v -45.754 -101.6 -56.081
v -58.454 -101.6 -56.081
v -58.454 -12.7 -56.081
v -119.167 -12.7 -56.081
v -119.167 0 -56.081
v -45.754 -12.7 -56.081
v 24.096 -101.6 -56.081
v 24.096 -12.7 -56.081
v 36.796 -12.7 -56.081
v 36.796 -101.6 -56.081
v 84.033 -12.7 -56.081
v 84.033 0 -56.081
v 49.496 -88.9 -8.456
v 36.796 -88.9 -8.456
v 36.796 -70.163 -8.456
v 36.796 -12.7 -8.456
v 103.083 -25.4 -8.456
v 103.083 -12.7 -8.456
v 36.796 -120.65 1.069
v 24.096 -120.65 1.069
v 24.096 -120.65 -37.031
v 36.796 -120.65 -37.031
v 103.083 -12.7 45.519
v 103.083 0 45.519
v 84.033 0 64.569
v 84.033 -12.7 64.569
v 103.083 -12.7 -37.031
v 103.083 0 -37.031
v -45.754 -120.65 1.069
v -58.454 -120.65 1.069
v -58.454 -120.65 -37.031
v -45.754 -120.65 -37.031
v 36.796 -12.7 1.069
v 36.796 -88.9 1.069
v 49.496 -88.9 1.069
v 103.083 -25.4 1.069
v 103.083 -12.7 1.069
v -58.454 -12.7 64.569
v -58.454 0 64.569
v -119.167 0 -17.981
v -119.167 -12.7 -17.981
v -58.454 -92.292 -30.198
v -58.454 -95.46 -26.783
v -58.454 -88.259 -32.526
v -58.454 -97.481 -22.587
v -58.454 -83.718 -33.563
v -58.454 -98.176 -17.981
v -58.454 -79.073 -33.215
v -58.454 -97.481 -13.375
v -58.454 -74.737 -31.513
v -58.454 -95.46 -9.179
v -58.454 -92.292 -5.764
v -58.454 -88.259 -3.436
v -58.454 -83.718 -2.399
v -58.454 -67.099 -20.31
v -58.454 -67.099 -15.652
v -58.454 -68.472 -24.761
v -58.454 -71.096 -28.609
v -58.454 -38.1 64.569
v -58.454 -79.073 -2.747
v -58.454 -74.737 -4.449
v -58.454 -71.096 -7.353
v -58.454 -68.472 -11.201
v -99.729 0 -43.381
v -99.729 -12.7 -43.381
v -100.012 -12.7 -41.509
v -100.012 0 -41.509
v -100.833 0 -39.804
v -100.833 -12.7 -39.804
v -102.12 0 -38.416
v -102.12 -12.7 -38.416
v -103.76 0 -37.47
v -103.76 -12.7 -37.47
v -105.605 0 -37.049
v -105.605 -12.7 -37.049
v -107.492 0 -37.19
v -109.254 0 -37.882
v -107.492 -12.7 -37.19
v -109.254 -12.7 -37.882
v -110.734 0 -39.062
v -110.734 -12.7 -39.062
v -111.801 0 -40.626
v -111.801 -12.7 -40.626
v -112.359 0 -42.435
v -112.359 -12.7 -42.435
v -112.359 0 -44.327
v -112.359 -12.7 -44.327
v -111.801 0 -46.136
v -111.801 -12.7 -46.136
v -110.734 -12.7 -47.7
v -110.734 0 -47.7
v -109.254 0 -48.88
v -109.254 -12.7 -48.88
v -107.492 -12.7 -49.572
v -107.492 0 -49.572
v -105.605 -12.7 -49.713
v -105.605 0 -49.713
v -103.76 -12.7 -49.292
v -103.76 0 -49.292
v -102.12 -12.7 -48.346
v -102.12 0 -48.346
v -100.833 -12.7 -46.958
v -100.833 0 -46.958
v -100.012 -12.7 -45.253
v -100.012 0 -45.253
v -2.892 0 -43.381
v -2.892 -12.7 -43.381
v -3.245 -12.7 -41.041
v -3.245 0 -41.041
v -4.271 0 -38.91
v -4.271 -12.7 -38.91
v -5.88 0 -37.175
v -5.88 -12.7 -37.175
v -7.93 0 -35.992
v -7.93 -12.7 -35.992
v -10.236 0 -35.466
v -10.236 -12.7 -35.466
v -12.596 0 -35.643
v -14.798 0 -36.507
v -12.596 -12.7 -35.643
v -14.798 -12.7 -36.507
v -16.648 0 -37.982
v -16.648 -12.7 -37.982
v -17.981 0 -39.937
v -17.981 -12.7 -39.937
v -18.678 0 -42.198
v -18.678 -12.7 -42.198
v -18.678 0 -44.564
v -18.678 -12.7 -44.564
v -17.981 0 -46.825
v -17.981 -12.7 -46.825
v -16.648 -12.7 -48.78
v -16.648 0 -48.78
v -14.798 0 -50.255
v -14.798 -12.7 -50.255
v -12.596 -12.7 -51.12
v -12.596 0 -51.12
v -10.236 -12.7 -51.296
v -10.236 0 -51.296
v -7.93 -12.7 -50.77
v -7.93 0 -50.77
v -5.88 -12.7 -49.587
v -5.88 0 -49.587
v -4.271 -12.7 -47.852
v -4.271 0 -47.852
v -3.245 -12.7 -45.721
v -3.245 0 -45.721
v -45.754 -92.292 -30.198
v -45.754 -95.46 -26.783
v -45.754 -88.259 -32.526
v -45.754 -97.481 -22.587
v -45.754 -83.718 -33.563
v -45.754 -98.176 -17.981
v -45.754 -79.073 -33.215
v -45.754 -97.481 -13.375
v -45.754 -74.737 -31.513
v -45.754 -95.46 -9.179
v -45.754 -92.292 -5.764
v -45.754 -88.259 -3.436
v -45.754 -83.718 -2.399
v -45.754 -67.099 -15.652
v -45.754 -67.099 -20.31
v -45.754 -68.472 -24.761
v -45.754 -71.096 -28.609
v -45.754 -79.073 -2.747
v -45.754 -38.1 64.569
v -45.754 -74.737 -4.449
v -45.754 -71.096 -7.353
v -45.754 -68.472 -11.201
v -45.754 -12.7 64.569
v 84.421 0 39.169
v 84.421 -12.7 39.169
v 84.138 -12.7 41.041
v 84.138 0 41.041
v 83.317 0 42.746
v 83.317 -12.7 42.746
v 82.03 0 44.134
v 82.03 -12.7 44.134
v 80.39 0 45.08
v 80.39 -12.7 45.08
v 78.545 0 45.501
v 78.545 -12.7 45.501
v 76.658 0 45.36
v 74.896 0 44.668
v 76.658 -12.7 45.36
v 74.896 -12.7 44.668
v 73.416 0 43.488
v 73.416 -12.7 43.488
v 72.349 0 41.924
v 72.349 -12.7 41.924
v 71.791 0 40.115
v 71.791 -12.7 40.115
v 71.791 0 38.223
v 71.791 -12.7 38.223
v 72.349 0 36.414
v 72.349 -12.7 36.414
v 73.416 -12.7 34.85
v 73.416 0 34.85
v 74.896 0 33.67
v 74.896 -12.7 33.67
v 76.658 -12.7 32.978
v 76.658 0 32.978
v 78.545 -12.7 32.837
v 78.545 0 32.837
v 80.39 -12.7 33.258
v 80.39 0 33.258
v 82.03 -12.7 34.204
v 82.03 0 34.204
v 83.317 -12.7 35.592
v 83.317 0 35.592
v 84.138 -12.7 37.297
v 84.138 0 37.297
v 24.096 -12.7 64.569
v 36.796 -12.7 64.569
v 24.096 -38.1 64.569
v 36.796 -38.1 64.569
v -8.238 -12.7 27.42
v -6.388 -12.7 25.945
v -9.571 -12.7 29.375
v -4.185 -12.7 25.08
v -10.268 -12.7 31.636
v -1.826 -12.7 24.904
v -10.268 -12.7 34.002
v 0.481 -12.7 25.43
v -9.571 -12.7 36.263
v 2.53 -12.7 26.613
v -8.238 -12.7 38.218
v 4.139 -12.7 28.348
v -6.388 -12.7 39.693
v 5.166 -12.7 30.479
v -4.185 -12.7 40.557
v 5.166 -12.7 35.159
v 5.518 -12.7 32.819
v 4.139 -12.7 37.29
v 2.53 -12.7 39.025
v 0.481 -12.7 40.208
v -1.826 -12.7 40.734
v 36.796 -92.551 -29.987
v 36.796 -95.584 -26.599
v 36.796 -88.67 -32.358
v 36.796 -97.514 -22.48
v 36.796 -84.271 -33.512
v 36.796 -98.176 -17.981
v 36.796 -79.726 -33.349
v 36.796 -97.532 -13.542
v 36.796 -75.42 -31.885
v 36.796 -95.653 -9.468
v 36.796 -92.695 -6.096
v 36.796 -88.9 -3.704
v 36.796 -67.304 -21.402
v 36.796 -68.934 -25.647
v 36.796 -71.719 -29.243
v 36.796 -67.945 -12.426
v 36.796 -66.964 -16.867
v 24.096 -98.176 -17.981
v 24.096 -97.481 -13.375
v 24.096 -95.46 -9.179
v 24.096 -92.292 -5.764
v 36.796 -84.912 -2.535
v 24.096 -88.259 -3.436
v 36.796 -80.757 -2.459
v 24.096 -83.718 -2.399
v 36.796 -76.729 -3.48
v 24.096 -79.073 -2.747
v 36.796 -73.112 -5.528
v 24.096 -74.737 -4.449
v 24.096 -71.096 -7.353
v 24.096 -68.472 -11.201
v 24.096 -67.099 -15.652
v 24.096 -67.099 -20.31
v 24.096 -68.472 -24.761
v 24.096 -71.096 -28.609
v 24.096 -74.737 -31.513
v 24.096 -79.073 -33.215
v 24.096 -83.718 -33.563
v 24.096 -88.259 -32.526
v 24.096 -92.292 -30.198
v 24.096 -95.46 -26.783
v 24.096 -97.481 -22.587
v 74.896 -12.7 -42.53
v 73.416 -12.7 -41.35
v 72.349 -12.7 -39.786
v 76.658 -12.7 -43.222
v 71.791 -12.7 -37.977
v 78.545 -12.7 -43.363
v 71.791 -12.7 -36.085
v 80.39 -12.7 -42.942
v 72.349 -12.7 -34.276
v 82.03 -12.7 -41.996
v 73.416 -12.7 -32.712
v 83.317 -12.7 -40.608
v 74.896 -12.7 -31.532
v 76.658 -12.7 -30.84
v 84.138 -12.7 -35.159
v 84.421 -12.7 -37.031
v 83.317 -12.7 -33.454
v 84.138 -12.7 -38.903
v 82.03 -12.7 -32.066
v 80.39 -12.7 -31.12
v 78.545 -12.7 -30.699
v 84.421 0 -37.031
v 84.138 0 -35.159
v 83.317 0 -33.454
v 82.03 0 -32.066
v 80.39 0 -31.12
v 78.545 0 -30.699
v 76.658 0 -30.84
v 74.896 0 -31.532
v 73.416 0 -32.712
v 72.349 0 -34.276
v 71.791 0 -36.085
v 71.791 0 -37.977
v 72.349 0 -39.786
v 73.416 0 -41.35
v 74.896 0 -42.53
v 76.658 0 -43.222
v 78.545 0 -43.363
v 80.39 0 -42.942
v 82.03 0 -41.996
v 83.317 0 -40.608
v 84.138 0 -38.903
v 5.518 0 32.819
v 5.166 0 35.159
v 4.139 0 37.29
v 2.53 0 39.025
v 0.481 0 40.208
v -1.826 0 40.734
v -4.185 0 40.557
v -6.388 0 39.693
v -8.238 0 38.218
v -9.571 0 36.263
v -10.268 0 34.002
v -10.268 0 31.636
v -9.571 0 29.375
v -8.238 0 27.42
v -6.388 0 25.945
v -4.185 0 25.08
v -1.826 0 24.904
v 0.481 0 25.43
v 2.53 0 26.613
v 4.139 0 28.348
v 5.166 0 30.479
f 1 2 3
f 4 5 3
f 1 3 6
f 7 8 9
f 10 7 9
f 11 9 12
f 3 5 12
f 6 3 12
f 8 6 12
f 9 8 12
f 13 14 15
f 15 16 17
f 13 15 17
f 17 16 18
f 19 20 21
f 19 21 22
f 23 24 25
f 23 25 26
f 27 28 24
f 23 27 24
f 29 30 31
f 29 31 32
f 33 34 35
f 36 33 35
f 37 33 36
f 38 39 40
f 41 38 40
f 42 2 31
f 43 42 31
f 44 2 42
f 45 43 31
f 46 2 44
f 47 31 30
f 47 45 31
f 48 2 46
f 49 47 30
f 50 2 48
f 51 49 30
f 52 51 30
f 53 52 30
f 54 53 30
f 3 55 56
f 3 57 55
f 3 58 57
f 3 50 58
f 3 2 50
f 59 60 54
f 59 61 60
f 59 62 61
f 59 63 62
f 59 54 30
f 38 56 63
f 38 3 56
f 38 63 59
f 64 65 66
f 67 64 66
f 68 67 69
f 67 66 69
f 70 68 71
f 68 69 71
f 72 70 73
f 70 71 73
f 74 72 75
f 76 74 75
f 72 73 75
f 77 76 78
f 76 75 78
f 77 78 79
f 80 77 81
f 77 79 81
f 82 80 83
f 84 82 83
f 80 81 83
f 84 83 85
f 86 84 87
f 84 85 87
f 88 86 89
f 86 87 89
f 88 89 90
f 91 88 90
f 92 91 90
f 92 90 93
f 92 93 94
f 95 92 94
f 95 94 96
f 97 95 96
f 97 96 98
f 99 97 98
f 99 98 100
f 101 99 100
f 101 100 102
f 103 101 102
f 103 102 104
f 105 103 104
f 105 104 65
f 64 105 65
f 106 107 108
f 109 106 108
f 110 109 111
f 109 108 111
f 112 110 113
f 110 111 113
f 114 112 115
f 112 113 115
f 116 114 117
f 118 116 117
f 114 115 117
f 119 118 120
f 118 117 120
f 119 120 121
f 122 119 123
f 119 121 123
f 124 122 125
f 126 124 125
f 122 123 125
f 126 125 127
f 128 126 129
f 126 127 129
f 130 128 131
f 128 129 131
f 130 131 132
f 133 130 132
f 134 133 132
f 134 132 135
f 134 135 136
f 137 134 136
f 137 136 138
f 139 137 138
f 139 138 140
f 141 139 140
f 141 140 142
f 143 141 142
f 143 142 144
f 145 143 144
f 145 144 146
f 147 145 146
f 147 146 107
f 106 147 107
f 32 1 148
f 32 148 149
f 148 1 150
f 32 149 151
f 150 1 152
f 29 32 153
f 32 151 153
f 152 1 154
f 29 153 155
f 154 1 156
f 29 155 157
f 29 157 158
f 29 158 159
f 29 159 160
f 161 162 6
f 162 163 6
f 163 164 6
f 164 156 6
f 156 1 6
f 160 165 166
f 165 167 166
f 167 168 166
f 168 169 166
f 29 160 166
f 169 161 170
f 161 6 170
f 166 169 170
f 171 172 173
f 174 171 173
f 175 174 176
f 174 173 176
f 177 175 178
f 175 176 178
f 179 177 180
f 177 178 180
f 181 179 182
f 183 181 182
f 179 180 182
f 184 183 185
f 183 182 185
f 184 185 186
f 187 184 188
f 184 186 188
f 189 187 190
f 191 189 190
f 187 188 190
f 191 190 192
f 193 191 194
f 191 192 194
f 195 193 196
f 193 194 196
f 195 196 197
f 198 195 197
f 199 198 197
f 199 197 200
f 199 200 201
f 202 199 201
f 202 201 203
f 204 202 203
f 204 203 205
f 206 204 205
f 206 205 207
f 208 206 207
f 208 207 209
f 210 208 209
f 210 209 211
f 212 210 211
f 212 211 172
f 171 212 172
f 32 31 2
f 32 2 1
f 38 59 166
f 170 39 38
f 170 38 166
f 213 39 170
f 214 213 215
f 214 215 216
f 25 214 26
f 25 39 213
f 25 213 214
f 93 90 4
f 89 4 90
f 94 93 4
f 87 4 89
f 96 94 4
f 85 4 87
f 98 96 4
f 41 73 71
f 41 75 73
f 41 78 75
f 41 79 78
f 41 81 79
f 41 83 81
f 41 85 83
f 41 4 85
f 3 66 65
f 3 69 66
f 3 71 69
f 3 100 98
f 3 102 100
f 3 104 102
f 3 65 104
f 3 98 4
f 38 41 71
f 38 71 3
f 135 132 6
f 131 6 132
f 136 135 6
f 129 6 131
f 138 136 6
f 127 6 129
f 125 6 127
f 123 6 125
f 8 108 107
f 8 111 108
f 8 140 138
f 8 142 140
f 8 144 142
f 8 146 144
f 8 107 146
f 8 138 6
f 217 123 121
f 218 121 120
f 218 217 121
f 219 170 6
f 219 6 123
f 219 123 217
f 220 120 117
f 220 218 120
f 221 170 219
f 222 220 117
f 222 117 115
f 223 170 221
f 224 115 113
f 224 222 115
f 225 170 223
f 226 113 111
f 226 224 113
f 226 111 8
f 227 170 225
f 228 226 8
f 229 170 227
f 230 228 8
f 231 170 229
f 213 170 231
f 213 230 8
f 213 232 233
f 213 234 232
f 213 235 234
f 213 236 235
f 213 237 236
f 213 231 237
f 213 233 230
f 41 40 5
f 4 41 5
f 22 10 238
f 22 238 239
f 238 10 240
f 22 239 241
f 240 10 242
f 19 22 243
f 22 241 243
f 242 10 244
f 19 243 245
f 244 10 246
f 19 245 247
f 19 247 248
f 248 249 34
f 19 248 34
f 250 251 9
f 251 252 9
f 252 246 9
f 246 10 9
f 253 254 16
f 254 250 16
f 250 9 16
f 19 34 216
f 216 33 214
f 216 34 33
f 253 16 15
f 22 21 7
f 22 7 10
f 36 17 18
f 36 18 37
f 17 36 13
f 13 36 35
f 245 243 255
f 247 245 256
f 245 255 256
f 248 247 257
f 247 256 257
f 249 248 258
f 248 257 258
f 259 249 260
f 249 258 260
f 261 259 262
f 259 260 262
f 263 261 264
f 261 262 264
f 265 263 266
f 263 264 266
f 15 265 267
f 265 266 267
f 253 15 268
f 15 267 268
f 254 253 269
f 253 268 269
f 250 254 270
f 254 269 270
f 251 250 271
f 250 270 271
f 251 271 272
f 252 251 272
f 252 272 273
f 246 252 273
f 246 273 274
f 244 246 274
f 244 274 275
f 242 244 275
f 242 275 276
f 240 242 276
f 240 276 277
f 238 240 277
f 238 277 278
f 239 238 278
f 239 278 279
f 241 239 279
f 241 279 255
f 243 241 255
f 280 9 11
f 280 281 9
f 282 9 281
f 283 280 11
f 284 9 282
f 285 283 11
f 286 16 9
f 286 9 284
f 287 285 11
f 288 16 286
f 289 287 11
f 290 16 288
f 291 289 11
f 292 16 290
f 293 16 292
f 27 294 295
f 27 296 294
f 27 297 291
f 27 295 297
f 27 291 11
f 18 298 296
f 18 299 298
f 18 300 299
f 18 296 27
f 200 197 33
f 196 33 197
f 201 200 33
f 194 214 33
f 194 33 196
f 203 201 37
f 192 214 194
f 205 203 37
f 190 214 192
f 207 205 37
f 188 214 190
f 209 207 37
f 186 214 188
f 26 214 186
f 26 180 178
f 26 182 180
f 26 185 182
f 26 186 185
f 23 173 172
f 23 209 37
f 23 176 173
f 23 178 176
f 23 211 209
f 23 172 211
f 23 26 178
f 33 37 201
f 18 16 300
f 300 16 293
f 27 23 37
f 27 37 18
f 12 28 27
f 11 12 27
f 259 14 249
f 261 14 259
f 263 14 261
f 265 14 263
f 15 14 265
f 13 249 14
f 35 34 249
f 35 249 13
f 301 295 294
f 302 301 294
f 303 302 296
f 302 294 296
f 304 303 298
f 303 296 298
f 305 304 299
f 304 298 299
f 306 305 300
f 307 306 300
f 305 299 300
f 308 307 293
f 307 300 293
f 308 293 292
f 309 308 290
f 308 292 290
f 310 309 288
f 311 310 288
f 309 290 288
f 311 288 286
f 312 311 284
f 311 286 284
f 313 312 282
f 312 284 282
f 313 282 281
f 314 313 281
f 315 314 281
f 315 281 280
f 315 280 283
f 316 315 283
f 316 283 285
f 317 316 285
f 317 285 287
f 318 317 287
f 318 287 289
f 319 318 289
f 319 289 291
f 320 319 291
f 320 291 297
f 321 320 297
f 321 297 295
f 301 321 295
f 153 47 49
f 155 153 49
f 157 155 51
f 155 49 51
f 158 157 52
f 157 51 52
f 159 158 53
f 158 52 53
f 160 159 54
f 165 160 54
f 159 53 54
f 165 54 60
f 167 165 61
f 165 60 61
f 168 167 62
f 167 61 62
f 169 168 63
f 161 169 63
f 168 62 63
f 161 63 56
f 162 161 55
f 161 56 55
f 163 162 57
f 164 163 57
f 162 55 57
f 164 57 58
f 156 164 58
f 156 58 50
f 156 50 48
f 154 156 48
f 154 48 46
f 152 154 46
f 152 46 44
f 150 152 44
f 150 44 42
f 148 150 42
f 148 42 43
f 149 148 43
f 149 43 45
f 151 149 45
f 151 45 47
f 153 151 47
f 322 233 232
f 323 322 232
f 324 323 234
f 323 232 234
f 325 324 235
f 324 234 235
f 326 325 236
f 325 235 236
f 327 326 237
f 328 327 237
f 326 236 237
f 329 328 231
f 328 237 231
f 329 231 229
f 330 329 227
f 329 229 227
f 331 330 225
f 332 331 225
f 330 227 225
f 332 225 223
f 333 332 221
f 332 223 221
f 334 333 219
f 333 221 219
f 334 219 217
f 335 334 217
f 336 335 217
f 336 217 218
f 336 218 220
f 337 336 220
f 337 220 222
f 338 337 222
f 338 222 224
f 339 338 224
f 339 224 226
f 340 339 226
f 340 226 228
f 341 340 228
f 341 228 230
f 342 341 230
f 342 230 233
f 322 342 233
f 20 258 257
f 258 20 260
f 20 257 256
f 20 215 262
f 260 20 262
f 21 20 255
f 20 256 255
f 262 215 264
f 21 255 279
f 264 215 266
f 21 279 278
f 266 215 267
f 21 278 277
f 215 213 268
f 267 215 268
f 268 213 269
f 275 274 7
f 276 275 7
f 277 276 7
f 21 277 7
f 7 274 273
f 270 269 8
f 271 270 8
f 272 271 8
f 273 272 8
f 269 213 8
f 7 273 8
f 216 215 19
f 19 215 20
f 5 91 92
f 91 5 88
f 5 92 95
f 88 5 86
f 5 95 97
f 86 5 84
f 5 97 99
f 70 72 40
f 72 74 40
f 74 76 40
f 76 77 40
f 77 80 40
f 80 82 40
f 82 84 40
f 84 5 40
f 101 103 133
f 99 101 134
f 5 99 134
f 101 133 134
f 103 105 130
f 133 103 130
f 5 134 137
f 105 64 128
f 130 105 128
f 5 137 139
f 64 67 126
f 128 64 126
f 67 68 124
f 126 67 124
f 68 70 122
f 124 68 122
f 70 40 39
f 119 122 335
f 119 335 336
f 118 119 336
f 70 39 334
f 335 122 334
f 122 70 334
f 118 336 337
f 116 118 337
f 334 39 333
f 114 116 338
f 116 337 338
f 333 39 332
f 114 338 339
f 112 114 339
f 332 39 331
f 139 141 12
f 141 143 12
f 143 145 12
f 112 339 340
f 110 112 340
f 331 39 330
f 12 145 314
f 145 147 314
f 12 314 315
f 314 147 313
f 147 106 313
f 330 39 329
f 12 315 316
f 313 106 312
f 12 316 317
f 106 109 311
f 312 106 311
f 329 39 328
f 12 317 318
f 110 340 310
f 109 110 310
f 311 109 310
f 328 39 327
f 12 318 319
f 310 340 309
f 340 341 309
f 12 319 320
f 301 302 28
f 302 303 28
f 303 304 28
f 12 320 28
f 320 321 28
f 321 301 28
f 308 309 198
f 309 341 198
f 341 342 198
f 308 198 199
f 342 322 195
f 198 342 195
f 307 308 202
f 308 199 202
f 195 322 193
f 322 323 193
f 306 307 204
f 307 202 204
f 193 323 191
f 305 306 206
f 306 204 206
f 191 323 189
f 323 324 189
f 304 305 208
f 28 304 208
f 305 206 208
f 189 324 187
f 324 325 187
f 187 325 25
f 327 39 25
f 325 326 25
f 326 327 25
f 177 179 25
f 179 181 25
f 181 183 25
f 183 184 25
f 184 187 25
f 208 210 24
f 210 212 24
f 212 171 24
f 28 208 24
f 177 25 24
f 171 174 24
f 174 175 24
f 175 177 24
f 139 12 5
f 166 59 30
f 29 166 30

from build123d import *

# Parameters (mm, degrees)
F1_DEPTH  = 12.7
F2_SIZE   = 19.05
F3_R      = 6.35
F3_R_2    = 7.9375
F4_DEPTH  = 25.4
F3_W      = 12.7
F3_H      = 120.65
F5_DEPTH  = 107.95
F6_SIZE   = 19.05
F8_DEPTH  = 193.548
F7_R      = 15.625598
F9_DEPTH  = 161.538807
F3_W_2    = 66.287807
F3_H_2    = 9.525
F10_DEPTH = 76.2
F12_DEPTH = 57.151


with BuildPart() as f1:
    # F0 (on Front) → F1 (new body)
    with BuildSketch(Plane.XZ):
        Polygon((103.08338, 64.568961), (-58.454427, 64.568961), (-119.16662, -17.981039), (-119.16662, -56.081039), (103.08338, -56.081039), align=None)
    extrude(amount=F1_DEPTH)

    # F2
    f2_edges = [f1.edges().sort_by_distance(p)[0] for p in [
        (103.08338, -6.35, -56.081039),
        (103.08338, -6.35, 64.568961),
    ]]
    chamfer(f2_edges, length=F2_SIZE)

    # F3 (on face) → F4 (cut)
    with BuildSketch(Plane.XZ.offset(12.7)):
        with Locations((78.070573, -37.031039)):
            Circle(F3_R)
        with Locations((78.070573, 39.168961)):
            Circle(F3_R)
        with Locations((-2.419149, 32.818961)):
            Circle(F3_R_2)
        with Locations((-10.829427, -43.381039)):
            Circle(F3_R_2)
        with Locations((-106.079427, -43.381039)):
            Circle(F3_R)
    extrude(amount=-F4_DEPTH, mode=Mode.SUBTRACT)

    # F3 (on face) → F5 (join)
    with BuildSketch(Plane.XZ.offset(12.7)):
        with Locations((-52.104427, 4.243961)):
            Rectangle(F3_W, F3_H)
        Polygon((36.795573, 64.568961), (24.095573, 64.568961), (24.095573, -56.081039), (36.795573, -56.081039), (36.795573, -8.456039), (36.795573, 1.068961), align=None)
    extrude(amount=F5_DEPTH)

    # F6
    f6_edges = [f1.edges().sort_by_distance(p)[0] for p in [
        (-52.104427, -120.65, -56.081039),
        (30.445573, -120.65, -56.081039),
    ]]
    chamfer(f6_edges, length=F6_SIZE)

    # F7 (on face) → F8 (cut)
    with BuildSketch(Plane(origin=(-58.454427, 0, 0), x_dir=(0, -1, 0), z_dir=(-1, 0, 0))):
        Polygon((38.1, 64.568961), (120.65, 1.068961), (120.65, 64.568961), align=None)
    extrude(amount=-F8_DEPTH, mode=Mode.SUBTRACT)

    # F7 (on face) → F9 (cut, through all)
    with BuildSketch(Plane(origin=(-58.454427, 0, 0), x_dir=(0, -1, 0), z_dir=(-1, 0, 0))):
        with Locations((82.55, -17.981039)):
            Circle(F7_R)
    extrude(amount=-F9_DEPTH, mode=Mode.SUBTRACT)

    # F3 (on face) → F10 (join)
    with BuildSketch(Plane.XZ.offset(12.7)):
        with Locations((69.939476, -3.693539)):
            Rectangle(F3_W_2, F3_H_2)
    extrude(amount=F10_DEPTH)

    # F11 (on face) → F12 (cut, through all)
    with BuildSketch(Plane.XY.offset(1.068961)):
        Polygon((103.08338, -25.4), (49.495573, -88.9), (103.08338, -88.9), align=None)
    extrude(amount=-F12_DEPTH, mode=Mode.SUBTRACT)


solid = f1.part
